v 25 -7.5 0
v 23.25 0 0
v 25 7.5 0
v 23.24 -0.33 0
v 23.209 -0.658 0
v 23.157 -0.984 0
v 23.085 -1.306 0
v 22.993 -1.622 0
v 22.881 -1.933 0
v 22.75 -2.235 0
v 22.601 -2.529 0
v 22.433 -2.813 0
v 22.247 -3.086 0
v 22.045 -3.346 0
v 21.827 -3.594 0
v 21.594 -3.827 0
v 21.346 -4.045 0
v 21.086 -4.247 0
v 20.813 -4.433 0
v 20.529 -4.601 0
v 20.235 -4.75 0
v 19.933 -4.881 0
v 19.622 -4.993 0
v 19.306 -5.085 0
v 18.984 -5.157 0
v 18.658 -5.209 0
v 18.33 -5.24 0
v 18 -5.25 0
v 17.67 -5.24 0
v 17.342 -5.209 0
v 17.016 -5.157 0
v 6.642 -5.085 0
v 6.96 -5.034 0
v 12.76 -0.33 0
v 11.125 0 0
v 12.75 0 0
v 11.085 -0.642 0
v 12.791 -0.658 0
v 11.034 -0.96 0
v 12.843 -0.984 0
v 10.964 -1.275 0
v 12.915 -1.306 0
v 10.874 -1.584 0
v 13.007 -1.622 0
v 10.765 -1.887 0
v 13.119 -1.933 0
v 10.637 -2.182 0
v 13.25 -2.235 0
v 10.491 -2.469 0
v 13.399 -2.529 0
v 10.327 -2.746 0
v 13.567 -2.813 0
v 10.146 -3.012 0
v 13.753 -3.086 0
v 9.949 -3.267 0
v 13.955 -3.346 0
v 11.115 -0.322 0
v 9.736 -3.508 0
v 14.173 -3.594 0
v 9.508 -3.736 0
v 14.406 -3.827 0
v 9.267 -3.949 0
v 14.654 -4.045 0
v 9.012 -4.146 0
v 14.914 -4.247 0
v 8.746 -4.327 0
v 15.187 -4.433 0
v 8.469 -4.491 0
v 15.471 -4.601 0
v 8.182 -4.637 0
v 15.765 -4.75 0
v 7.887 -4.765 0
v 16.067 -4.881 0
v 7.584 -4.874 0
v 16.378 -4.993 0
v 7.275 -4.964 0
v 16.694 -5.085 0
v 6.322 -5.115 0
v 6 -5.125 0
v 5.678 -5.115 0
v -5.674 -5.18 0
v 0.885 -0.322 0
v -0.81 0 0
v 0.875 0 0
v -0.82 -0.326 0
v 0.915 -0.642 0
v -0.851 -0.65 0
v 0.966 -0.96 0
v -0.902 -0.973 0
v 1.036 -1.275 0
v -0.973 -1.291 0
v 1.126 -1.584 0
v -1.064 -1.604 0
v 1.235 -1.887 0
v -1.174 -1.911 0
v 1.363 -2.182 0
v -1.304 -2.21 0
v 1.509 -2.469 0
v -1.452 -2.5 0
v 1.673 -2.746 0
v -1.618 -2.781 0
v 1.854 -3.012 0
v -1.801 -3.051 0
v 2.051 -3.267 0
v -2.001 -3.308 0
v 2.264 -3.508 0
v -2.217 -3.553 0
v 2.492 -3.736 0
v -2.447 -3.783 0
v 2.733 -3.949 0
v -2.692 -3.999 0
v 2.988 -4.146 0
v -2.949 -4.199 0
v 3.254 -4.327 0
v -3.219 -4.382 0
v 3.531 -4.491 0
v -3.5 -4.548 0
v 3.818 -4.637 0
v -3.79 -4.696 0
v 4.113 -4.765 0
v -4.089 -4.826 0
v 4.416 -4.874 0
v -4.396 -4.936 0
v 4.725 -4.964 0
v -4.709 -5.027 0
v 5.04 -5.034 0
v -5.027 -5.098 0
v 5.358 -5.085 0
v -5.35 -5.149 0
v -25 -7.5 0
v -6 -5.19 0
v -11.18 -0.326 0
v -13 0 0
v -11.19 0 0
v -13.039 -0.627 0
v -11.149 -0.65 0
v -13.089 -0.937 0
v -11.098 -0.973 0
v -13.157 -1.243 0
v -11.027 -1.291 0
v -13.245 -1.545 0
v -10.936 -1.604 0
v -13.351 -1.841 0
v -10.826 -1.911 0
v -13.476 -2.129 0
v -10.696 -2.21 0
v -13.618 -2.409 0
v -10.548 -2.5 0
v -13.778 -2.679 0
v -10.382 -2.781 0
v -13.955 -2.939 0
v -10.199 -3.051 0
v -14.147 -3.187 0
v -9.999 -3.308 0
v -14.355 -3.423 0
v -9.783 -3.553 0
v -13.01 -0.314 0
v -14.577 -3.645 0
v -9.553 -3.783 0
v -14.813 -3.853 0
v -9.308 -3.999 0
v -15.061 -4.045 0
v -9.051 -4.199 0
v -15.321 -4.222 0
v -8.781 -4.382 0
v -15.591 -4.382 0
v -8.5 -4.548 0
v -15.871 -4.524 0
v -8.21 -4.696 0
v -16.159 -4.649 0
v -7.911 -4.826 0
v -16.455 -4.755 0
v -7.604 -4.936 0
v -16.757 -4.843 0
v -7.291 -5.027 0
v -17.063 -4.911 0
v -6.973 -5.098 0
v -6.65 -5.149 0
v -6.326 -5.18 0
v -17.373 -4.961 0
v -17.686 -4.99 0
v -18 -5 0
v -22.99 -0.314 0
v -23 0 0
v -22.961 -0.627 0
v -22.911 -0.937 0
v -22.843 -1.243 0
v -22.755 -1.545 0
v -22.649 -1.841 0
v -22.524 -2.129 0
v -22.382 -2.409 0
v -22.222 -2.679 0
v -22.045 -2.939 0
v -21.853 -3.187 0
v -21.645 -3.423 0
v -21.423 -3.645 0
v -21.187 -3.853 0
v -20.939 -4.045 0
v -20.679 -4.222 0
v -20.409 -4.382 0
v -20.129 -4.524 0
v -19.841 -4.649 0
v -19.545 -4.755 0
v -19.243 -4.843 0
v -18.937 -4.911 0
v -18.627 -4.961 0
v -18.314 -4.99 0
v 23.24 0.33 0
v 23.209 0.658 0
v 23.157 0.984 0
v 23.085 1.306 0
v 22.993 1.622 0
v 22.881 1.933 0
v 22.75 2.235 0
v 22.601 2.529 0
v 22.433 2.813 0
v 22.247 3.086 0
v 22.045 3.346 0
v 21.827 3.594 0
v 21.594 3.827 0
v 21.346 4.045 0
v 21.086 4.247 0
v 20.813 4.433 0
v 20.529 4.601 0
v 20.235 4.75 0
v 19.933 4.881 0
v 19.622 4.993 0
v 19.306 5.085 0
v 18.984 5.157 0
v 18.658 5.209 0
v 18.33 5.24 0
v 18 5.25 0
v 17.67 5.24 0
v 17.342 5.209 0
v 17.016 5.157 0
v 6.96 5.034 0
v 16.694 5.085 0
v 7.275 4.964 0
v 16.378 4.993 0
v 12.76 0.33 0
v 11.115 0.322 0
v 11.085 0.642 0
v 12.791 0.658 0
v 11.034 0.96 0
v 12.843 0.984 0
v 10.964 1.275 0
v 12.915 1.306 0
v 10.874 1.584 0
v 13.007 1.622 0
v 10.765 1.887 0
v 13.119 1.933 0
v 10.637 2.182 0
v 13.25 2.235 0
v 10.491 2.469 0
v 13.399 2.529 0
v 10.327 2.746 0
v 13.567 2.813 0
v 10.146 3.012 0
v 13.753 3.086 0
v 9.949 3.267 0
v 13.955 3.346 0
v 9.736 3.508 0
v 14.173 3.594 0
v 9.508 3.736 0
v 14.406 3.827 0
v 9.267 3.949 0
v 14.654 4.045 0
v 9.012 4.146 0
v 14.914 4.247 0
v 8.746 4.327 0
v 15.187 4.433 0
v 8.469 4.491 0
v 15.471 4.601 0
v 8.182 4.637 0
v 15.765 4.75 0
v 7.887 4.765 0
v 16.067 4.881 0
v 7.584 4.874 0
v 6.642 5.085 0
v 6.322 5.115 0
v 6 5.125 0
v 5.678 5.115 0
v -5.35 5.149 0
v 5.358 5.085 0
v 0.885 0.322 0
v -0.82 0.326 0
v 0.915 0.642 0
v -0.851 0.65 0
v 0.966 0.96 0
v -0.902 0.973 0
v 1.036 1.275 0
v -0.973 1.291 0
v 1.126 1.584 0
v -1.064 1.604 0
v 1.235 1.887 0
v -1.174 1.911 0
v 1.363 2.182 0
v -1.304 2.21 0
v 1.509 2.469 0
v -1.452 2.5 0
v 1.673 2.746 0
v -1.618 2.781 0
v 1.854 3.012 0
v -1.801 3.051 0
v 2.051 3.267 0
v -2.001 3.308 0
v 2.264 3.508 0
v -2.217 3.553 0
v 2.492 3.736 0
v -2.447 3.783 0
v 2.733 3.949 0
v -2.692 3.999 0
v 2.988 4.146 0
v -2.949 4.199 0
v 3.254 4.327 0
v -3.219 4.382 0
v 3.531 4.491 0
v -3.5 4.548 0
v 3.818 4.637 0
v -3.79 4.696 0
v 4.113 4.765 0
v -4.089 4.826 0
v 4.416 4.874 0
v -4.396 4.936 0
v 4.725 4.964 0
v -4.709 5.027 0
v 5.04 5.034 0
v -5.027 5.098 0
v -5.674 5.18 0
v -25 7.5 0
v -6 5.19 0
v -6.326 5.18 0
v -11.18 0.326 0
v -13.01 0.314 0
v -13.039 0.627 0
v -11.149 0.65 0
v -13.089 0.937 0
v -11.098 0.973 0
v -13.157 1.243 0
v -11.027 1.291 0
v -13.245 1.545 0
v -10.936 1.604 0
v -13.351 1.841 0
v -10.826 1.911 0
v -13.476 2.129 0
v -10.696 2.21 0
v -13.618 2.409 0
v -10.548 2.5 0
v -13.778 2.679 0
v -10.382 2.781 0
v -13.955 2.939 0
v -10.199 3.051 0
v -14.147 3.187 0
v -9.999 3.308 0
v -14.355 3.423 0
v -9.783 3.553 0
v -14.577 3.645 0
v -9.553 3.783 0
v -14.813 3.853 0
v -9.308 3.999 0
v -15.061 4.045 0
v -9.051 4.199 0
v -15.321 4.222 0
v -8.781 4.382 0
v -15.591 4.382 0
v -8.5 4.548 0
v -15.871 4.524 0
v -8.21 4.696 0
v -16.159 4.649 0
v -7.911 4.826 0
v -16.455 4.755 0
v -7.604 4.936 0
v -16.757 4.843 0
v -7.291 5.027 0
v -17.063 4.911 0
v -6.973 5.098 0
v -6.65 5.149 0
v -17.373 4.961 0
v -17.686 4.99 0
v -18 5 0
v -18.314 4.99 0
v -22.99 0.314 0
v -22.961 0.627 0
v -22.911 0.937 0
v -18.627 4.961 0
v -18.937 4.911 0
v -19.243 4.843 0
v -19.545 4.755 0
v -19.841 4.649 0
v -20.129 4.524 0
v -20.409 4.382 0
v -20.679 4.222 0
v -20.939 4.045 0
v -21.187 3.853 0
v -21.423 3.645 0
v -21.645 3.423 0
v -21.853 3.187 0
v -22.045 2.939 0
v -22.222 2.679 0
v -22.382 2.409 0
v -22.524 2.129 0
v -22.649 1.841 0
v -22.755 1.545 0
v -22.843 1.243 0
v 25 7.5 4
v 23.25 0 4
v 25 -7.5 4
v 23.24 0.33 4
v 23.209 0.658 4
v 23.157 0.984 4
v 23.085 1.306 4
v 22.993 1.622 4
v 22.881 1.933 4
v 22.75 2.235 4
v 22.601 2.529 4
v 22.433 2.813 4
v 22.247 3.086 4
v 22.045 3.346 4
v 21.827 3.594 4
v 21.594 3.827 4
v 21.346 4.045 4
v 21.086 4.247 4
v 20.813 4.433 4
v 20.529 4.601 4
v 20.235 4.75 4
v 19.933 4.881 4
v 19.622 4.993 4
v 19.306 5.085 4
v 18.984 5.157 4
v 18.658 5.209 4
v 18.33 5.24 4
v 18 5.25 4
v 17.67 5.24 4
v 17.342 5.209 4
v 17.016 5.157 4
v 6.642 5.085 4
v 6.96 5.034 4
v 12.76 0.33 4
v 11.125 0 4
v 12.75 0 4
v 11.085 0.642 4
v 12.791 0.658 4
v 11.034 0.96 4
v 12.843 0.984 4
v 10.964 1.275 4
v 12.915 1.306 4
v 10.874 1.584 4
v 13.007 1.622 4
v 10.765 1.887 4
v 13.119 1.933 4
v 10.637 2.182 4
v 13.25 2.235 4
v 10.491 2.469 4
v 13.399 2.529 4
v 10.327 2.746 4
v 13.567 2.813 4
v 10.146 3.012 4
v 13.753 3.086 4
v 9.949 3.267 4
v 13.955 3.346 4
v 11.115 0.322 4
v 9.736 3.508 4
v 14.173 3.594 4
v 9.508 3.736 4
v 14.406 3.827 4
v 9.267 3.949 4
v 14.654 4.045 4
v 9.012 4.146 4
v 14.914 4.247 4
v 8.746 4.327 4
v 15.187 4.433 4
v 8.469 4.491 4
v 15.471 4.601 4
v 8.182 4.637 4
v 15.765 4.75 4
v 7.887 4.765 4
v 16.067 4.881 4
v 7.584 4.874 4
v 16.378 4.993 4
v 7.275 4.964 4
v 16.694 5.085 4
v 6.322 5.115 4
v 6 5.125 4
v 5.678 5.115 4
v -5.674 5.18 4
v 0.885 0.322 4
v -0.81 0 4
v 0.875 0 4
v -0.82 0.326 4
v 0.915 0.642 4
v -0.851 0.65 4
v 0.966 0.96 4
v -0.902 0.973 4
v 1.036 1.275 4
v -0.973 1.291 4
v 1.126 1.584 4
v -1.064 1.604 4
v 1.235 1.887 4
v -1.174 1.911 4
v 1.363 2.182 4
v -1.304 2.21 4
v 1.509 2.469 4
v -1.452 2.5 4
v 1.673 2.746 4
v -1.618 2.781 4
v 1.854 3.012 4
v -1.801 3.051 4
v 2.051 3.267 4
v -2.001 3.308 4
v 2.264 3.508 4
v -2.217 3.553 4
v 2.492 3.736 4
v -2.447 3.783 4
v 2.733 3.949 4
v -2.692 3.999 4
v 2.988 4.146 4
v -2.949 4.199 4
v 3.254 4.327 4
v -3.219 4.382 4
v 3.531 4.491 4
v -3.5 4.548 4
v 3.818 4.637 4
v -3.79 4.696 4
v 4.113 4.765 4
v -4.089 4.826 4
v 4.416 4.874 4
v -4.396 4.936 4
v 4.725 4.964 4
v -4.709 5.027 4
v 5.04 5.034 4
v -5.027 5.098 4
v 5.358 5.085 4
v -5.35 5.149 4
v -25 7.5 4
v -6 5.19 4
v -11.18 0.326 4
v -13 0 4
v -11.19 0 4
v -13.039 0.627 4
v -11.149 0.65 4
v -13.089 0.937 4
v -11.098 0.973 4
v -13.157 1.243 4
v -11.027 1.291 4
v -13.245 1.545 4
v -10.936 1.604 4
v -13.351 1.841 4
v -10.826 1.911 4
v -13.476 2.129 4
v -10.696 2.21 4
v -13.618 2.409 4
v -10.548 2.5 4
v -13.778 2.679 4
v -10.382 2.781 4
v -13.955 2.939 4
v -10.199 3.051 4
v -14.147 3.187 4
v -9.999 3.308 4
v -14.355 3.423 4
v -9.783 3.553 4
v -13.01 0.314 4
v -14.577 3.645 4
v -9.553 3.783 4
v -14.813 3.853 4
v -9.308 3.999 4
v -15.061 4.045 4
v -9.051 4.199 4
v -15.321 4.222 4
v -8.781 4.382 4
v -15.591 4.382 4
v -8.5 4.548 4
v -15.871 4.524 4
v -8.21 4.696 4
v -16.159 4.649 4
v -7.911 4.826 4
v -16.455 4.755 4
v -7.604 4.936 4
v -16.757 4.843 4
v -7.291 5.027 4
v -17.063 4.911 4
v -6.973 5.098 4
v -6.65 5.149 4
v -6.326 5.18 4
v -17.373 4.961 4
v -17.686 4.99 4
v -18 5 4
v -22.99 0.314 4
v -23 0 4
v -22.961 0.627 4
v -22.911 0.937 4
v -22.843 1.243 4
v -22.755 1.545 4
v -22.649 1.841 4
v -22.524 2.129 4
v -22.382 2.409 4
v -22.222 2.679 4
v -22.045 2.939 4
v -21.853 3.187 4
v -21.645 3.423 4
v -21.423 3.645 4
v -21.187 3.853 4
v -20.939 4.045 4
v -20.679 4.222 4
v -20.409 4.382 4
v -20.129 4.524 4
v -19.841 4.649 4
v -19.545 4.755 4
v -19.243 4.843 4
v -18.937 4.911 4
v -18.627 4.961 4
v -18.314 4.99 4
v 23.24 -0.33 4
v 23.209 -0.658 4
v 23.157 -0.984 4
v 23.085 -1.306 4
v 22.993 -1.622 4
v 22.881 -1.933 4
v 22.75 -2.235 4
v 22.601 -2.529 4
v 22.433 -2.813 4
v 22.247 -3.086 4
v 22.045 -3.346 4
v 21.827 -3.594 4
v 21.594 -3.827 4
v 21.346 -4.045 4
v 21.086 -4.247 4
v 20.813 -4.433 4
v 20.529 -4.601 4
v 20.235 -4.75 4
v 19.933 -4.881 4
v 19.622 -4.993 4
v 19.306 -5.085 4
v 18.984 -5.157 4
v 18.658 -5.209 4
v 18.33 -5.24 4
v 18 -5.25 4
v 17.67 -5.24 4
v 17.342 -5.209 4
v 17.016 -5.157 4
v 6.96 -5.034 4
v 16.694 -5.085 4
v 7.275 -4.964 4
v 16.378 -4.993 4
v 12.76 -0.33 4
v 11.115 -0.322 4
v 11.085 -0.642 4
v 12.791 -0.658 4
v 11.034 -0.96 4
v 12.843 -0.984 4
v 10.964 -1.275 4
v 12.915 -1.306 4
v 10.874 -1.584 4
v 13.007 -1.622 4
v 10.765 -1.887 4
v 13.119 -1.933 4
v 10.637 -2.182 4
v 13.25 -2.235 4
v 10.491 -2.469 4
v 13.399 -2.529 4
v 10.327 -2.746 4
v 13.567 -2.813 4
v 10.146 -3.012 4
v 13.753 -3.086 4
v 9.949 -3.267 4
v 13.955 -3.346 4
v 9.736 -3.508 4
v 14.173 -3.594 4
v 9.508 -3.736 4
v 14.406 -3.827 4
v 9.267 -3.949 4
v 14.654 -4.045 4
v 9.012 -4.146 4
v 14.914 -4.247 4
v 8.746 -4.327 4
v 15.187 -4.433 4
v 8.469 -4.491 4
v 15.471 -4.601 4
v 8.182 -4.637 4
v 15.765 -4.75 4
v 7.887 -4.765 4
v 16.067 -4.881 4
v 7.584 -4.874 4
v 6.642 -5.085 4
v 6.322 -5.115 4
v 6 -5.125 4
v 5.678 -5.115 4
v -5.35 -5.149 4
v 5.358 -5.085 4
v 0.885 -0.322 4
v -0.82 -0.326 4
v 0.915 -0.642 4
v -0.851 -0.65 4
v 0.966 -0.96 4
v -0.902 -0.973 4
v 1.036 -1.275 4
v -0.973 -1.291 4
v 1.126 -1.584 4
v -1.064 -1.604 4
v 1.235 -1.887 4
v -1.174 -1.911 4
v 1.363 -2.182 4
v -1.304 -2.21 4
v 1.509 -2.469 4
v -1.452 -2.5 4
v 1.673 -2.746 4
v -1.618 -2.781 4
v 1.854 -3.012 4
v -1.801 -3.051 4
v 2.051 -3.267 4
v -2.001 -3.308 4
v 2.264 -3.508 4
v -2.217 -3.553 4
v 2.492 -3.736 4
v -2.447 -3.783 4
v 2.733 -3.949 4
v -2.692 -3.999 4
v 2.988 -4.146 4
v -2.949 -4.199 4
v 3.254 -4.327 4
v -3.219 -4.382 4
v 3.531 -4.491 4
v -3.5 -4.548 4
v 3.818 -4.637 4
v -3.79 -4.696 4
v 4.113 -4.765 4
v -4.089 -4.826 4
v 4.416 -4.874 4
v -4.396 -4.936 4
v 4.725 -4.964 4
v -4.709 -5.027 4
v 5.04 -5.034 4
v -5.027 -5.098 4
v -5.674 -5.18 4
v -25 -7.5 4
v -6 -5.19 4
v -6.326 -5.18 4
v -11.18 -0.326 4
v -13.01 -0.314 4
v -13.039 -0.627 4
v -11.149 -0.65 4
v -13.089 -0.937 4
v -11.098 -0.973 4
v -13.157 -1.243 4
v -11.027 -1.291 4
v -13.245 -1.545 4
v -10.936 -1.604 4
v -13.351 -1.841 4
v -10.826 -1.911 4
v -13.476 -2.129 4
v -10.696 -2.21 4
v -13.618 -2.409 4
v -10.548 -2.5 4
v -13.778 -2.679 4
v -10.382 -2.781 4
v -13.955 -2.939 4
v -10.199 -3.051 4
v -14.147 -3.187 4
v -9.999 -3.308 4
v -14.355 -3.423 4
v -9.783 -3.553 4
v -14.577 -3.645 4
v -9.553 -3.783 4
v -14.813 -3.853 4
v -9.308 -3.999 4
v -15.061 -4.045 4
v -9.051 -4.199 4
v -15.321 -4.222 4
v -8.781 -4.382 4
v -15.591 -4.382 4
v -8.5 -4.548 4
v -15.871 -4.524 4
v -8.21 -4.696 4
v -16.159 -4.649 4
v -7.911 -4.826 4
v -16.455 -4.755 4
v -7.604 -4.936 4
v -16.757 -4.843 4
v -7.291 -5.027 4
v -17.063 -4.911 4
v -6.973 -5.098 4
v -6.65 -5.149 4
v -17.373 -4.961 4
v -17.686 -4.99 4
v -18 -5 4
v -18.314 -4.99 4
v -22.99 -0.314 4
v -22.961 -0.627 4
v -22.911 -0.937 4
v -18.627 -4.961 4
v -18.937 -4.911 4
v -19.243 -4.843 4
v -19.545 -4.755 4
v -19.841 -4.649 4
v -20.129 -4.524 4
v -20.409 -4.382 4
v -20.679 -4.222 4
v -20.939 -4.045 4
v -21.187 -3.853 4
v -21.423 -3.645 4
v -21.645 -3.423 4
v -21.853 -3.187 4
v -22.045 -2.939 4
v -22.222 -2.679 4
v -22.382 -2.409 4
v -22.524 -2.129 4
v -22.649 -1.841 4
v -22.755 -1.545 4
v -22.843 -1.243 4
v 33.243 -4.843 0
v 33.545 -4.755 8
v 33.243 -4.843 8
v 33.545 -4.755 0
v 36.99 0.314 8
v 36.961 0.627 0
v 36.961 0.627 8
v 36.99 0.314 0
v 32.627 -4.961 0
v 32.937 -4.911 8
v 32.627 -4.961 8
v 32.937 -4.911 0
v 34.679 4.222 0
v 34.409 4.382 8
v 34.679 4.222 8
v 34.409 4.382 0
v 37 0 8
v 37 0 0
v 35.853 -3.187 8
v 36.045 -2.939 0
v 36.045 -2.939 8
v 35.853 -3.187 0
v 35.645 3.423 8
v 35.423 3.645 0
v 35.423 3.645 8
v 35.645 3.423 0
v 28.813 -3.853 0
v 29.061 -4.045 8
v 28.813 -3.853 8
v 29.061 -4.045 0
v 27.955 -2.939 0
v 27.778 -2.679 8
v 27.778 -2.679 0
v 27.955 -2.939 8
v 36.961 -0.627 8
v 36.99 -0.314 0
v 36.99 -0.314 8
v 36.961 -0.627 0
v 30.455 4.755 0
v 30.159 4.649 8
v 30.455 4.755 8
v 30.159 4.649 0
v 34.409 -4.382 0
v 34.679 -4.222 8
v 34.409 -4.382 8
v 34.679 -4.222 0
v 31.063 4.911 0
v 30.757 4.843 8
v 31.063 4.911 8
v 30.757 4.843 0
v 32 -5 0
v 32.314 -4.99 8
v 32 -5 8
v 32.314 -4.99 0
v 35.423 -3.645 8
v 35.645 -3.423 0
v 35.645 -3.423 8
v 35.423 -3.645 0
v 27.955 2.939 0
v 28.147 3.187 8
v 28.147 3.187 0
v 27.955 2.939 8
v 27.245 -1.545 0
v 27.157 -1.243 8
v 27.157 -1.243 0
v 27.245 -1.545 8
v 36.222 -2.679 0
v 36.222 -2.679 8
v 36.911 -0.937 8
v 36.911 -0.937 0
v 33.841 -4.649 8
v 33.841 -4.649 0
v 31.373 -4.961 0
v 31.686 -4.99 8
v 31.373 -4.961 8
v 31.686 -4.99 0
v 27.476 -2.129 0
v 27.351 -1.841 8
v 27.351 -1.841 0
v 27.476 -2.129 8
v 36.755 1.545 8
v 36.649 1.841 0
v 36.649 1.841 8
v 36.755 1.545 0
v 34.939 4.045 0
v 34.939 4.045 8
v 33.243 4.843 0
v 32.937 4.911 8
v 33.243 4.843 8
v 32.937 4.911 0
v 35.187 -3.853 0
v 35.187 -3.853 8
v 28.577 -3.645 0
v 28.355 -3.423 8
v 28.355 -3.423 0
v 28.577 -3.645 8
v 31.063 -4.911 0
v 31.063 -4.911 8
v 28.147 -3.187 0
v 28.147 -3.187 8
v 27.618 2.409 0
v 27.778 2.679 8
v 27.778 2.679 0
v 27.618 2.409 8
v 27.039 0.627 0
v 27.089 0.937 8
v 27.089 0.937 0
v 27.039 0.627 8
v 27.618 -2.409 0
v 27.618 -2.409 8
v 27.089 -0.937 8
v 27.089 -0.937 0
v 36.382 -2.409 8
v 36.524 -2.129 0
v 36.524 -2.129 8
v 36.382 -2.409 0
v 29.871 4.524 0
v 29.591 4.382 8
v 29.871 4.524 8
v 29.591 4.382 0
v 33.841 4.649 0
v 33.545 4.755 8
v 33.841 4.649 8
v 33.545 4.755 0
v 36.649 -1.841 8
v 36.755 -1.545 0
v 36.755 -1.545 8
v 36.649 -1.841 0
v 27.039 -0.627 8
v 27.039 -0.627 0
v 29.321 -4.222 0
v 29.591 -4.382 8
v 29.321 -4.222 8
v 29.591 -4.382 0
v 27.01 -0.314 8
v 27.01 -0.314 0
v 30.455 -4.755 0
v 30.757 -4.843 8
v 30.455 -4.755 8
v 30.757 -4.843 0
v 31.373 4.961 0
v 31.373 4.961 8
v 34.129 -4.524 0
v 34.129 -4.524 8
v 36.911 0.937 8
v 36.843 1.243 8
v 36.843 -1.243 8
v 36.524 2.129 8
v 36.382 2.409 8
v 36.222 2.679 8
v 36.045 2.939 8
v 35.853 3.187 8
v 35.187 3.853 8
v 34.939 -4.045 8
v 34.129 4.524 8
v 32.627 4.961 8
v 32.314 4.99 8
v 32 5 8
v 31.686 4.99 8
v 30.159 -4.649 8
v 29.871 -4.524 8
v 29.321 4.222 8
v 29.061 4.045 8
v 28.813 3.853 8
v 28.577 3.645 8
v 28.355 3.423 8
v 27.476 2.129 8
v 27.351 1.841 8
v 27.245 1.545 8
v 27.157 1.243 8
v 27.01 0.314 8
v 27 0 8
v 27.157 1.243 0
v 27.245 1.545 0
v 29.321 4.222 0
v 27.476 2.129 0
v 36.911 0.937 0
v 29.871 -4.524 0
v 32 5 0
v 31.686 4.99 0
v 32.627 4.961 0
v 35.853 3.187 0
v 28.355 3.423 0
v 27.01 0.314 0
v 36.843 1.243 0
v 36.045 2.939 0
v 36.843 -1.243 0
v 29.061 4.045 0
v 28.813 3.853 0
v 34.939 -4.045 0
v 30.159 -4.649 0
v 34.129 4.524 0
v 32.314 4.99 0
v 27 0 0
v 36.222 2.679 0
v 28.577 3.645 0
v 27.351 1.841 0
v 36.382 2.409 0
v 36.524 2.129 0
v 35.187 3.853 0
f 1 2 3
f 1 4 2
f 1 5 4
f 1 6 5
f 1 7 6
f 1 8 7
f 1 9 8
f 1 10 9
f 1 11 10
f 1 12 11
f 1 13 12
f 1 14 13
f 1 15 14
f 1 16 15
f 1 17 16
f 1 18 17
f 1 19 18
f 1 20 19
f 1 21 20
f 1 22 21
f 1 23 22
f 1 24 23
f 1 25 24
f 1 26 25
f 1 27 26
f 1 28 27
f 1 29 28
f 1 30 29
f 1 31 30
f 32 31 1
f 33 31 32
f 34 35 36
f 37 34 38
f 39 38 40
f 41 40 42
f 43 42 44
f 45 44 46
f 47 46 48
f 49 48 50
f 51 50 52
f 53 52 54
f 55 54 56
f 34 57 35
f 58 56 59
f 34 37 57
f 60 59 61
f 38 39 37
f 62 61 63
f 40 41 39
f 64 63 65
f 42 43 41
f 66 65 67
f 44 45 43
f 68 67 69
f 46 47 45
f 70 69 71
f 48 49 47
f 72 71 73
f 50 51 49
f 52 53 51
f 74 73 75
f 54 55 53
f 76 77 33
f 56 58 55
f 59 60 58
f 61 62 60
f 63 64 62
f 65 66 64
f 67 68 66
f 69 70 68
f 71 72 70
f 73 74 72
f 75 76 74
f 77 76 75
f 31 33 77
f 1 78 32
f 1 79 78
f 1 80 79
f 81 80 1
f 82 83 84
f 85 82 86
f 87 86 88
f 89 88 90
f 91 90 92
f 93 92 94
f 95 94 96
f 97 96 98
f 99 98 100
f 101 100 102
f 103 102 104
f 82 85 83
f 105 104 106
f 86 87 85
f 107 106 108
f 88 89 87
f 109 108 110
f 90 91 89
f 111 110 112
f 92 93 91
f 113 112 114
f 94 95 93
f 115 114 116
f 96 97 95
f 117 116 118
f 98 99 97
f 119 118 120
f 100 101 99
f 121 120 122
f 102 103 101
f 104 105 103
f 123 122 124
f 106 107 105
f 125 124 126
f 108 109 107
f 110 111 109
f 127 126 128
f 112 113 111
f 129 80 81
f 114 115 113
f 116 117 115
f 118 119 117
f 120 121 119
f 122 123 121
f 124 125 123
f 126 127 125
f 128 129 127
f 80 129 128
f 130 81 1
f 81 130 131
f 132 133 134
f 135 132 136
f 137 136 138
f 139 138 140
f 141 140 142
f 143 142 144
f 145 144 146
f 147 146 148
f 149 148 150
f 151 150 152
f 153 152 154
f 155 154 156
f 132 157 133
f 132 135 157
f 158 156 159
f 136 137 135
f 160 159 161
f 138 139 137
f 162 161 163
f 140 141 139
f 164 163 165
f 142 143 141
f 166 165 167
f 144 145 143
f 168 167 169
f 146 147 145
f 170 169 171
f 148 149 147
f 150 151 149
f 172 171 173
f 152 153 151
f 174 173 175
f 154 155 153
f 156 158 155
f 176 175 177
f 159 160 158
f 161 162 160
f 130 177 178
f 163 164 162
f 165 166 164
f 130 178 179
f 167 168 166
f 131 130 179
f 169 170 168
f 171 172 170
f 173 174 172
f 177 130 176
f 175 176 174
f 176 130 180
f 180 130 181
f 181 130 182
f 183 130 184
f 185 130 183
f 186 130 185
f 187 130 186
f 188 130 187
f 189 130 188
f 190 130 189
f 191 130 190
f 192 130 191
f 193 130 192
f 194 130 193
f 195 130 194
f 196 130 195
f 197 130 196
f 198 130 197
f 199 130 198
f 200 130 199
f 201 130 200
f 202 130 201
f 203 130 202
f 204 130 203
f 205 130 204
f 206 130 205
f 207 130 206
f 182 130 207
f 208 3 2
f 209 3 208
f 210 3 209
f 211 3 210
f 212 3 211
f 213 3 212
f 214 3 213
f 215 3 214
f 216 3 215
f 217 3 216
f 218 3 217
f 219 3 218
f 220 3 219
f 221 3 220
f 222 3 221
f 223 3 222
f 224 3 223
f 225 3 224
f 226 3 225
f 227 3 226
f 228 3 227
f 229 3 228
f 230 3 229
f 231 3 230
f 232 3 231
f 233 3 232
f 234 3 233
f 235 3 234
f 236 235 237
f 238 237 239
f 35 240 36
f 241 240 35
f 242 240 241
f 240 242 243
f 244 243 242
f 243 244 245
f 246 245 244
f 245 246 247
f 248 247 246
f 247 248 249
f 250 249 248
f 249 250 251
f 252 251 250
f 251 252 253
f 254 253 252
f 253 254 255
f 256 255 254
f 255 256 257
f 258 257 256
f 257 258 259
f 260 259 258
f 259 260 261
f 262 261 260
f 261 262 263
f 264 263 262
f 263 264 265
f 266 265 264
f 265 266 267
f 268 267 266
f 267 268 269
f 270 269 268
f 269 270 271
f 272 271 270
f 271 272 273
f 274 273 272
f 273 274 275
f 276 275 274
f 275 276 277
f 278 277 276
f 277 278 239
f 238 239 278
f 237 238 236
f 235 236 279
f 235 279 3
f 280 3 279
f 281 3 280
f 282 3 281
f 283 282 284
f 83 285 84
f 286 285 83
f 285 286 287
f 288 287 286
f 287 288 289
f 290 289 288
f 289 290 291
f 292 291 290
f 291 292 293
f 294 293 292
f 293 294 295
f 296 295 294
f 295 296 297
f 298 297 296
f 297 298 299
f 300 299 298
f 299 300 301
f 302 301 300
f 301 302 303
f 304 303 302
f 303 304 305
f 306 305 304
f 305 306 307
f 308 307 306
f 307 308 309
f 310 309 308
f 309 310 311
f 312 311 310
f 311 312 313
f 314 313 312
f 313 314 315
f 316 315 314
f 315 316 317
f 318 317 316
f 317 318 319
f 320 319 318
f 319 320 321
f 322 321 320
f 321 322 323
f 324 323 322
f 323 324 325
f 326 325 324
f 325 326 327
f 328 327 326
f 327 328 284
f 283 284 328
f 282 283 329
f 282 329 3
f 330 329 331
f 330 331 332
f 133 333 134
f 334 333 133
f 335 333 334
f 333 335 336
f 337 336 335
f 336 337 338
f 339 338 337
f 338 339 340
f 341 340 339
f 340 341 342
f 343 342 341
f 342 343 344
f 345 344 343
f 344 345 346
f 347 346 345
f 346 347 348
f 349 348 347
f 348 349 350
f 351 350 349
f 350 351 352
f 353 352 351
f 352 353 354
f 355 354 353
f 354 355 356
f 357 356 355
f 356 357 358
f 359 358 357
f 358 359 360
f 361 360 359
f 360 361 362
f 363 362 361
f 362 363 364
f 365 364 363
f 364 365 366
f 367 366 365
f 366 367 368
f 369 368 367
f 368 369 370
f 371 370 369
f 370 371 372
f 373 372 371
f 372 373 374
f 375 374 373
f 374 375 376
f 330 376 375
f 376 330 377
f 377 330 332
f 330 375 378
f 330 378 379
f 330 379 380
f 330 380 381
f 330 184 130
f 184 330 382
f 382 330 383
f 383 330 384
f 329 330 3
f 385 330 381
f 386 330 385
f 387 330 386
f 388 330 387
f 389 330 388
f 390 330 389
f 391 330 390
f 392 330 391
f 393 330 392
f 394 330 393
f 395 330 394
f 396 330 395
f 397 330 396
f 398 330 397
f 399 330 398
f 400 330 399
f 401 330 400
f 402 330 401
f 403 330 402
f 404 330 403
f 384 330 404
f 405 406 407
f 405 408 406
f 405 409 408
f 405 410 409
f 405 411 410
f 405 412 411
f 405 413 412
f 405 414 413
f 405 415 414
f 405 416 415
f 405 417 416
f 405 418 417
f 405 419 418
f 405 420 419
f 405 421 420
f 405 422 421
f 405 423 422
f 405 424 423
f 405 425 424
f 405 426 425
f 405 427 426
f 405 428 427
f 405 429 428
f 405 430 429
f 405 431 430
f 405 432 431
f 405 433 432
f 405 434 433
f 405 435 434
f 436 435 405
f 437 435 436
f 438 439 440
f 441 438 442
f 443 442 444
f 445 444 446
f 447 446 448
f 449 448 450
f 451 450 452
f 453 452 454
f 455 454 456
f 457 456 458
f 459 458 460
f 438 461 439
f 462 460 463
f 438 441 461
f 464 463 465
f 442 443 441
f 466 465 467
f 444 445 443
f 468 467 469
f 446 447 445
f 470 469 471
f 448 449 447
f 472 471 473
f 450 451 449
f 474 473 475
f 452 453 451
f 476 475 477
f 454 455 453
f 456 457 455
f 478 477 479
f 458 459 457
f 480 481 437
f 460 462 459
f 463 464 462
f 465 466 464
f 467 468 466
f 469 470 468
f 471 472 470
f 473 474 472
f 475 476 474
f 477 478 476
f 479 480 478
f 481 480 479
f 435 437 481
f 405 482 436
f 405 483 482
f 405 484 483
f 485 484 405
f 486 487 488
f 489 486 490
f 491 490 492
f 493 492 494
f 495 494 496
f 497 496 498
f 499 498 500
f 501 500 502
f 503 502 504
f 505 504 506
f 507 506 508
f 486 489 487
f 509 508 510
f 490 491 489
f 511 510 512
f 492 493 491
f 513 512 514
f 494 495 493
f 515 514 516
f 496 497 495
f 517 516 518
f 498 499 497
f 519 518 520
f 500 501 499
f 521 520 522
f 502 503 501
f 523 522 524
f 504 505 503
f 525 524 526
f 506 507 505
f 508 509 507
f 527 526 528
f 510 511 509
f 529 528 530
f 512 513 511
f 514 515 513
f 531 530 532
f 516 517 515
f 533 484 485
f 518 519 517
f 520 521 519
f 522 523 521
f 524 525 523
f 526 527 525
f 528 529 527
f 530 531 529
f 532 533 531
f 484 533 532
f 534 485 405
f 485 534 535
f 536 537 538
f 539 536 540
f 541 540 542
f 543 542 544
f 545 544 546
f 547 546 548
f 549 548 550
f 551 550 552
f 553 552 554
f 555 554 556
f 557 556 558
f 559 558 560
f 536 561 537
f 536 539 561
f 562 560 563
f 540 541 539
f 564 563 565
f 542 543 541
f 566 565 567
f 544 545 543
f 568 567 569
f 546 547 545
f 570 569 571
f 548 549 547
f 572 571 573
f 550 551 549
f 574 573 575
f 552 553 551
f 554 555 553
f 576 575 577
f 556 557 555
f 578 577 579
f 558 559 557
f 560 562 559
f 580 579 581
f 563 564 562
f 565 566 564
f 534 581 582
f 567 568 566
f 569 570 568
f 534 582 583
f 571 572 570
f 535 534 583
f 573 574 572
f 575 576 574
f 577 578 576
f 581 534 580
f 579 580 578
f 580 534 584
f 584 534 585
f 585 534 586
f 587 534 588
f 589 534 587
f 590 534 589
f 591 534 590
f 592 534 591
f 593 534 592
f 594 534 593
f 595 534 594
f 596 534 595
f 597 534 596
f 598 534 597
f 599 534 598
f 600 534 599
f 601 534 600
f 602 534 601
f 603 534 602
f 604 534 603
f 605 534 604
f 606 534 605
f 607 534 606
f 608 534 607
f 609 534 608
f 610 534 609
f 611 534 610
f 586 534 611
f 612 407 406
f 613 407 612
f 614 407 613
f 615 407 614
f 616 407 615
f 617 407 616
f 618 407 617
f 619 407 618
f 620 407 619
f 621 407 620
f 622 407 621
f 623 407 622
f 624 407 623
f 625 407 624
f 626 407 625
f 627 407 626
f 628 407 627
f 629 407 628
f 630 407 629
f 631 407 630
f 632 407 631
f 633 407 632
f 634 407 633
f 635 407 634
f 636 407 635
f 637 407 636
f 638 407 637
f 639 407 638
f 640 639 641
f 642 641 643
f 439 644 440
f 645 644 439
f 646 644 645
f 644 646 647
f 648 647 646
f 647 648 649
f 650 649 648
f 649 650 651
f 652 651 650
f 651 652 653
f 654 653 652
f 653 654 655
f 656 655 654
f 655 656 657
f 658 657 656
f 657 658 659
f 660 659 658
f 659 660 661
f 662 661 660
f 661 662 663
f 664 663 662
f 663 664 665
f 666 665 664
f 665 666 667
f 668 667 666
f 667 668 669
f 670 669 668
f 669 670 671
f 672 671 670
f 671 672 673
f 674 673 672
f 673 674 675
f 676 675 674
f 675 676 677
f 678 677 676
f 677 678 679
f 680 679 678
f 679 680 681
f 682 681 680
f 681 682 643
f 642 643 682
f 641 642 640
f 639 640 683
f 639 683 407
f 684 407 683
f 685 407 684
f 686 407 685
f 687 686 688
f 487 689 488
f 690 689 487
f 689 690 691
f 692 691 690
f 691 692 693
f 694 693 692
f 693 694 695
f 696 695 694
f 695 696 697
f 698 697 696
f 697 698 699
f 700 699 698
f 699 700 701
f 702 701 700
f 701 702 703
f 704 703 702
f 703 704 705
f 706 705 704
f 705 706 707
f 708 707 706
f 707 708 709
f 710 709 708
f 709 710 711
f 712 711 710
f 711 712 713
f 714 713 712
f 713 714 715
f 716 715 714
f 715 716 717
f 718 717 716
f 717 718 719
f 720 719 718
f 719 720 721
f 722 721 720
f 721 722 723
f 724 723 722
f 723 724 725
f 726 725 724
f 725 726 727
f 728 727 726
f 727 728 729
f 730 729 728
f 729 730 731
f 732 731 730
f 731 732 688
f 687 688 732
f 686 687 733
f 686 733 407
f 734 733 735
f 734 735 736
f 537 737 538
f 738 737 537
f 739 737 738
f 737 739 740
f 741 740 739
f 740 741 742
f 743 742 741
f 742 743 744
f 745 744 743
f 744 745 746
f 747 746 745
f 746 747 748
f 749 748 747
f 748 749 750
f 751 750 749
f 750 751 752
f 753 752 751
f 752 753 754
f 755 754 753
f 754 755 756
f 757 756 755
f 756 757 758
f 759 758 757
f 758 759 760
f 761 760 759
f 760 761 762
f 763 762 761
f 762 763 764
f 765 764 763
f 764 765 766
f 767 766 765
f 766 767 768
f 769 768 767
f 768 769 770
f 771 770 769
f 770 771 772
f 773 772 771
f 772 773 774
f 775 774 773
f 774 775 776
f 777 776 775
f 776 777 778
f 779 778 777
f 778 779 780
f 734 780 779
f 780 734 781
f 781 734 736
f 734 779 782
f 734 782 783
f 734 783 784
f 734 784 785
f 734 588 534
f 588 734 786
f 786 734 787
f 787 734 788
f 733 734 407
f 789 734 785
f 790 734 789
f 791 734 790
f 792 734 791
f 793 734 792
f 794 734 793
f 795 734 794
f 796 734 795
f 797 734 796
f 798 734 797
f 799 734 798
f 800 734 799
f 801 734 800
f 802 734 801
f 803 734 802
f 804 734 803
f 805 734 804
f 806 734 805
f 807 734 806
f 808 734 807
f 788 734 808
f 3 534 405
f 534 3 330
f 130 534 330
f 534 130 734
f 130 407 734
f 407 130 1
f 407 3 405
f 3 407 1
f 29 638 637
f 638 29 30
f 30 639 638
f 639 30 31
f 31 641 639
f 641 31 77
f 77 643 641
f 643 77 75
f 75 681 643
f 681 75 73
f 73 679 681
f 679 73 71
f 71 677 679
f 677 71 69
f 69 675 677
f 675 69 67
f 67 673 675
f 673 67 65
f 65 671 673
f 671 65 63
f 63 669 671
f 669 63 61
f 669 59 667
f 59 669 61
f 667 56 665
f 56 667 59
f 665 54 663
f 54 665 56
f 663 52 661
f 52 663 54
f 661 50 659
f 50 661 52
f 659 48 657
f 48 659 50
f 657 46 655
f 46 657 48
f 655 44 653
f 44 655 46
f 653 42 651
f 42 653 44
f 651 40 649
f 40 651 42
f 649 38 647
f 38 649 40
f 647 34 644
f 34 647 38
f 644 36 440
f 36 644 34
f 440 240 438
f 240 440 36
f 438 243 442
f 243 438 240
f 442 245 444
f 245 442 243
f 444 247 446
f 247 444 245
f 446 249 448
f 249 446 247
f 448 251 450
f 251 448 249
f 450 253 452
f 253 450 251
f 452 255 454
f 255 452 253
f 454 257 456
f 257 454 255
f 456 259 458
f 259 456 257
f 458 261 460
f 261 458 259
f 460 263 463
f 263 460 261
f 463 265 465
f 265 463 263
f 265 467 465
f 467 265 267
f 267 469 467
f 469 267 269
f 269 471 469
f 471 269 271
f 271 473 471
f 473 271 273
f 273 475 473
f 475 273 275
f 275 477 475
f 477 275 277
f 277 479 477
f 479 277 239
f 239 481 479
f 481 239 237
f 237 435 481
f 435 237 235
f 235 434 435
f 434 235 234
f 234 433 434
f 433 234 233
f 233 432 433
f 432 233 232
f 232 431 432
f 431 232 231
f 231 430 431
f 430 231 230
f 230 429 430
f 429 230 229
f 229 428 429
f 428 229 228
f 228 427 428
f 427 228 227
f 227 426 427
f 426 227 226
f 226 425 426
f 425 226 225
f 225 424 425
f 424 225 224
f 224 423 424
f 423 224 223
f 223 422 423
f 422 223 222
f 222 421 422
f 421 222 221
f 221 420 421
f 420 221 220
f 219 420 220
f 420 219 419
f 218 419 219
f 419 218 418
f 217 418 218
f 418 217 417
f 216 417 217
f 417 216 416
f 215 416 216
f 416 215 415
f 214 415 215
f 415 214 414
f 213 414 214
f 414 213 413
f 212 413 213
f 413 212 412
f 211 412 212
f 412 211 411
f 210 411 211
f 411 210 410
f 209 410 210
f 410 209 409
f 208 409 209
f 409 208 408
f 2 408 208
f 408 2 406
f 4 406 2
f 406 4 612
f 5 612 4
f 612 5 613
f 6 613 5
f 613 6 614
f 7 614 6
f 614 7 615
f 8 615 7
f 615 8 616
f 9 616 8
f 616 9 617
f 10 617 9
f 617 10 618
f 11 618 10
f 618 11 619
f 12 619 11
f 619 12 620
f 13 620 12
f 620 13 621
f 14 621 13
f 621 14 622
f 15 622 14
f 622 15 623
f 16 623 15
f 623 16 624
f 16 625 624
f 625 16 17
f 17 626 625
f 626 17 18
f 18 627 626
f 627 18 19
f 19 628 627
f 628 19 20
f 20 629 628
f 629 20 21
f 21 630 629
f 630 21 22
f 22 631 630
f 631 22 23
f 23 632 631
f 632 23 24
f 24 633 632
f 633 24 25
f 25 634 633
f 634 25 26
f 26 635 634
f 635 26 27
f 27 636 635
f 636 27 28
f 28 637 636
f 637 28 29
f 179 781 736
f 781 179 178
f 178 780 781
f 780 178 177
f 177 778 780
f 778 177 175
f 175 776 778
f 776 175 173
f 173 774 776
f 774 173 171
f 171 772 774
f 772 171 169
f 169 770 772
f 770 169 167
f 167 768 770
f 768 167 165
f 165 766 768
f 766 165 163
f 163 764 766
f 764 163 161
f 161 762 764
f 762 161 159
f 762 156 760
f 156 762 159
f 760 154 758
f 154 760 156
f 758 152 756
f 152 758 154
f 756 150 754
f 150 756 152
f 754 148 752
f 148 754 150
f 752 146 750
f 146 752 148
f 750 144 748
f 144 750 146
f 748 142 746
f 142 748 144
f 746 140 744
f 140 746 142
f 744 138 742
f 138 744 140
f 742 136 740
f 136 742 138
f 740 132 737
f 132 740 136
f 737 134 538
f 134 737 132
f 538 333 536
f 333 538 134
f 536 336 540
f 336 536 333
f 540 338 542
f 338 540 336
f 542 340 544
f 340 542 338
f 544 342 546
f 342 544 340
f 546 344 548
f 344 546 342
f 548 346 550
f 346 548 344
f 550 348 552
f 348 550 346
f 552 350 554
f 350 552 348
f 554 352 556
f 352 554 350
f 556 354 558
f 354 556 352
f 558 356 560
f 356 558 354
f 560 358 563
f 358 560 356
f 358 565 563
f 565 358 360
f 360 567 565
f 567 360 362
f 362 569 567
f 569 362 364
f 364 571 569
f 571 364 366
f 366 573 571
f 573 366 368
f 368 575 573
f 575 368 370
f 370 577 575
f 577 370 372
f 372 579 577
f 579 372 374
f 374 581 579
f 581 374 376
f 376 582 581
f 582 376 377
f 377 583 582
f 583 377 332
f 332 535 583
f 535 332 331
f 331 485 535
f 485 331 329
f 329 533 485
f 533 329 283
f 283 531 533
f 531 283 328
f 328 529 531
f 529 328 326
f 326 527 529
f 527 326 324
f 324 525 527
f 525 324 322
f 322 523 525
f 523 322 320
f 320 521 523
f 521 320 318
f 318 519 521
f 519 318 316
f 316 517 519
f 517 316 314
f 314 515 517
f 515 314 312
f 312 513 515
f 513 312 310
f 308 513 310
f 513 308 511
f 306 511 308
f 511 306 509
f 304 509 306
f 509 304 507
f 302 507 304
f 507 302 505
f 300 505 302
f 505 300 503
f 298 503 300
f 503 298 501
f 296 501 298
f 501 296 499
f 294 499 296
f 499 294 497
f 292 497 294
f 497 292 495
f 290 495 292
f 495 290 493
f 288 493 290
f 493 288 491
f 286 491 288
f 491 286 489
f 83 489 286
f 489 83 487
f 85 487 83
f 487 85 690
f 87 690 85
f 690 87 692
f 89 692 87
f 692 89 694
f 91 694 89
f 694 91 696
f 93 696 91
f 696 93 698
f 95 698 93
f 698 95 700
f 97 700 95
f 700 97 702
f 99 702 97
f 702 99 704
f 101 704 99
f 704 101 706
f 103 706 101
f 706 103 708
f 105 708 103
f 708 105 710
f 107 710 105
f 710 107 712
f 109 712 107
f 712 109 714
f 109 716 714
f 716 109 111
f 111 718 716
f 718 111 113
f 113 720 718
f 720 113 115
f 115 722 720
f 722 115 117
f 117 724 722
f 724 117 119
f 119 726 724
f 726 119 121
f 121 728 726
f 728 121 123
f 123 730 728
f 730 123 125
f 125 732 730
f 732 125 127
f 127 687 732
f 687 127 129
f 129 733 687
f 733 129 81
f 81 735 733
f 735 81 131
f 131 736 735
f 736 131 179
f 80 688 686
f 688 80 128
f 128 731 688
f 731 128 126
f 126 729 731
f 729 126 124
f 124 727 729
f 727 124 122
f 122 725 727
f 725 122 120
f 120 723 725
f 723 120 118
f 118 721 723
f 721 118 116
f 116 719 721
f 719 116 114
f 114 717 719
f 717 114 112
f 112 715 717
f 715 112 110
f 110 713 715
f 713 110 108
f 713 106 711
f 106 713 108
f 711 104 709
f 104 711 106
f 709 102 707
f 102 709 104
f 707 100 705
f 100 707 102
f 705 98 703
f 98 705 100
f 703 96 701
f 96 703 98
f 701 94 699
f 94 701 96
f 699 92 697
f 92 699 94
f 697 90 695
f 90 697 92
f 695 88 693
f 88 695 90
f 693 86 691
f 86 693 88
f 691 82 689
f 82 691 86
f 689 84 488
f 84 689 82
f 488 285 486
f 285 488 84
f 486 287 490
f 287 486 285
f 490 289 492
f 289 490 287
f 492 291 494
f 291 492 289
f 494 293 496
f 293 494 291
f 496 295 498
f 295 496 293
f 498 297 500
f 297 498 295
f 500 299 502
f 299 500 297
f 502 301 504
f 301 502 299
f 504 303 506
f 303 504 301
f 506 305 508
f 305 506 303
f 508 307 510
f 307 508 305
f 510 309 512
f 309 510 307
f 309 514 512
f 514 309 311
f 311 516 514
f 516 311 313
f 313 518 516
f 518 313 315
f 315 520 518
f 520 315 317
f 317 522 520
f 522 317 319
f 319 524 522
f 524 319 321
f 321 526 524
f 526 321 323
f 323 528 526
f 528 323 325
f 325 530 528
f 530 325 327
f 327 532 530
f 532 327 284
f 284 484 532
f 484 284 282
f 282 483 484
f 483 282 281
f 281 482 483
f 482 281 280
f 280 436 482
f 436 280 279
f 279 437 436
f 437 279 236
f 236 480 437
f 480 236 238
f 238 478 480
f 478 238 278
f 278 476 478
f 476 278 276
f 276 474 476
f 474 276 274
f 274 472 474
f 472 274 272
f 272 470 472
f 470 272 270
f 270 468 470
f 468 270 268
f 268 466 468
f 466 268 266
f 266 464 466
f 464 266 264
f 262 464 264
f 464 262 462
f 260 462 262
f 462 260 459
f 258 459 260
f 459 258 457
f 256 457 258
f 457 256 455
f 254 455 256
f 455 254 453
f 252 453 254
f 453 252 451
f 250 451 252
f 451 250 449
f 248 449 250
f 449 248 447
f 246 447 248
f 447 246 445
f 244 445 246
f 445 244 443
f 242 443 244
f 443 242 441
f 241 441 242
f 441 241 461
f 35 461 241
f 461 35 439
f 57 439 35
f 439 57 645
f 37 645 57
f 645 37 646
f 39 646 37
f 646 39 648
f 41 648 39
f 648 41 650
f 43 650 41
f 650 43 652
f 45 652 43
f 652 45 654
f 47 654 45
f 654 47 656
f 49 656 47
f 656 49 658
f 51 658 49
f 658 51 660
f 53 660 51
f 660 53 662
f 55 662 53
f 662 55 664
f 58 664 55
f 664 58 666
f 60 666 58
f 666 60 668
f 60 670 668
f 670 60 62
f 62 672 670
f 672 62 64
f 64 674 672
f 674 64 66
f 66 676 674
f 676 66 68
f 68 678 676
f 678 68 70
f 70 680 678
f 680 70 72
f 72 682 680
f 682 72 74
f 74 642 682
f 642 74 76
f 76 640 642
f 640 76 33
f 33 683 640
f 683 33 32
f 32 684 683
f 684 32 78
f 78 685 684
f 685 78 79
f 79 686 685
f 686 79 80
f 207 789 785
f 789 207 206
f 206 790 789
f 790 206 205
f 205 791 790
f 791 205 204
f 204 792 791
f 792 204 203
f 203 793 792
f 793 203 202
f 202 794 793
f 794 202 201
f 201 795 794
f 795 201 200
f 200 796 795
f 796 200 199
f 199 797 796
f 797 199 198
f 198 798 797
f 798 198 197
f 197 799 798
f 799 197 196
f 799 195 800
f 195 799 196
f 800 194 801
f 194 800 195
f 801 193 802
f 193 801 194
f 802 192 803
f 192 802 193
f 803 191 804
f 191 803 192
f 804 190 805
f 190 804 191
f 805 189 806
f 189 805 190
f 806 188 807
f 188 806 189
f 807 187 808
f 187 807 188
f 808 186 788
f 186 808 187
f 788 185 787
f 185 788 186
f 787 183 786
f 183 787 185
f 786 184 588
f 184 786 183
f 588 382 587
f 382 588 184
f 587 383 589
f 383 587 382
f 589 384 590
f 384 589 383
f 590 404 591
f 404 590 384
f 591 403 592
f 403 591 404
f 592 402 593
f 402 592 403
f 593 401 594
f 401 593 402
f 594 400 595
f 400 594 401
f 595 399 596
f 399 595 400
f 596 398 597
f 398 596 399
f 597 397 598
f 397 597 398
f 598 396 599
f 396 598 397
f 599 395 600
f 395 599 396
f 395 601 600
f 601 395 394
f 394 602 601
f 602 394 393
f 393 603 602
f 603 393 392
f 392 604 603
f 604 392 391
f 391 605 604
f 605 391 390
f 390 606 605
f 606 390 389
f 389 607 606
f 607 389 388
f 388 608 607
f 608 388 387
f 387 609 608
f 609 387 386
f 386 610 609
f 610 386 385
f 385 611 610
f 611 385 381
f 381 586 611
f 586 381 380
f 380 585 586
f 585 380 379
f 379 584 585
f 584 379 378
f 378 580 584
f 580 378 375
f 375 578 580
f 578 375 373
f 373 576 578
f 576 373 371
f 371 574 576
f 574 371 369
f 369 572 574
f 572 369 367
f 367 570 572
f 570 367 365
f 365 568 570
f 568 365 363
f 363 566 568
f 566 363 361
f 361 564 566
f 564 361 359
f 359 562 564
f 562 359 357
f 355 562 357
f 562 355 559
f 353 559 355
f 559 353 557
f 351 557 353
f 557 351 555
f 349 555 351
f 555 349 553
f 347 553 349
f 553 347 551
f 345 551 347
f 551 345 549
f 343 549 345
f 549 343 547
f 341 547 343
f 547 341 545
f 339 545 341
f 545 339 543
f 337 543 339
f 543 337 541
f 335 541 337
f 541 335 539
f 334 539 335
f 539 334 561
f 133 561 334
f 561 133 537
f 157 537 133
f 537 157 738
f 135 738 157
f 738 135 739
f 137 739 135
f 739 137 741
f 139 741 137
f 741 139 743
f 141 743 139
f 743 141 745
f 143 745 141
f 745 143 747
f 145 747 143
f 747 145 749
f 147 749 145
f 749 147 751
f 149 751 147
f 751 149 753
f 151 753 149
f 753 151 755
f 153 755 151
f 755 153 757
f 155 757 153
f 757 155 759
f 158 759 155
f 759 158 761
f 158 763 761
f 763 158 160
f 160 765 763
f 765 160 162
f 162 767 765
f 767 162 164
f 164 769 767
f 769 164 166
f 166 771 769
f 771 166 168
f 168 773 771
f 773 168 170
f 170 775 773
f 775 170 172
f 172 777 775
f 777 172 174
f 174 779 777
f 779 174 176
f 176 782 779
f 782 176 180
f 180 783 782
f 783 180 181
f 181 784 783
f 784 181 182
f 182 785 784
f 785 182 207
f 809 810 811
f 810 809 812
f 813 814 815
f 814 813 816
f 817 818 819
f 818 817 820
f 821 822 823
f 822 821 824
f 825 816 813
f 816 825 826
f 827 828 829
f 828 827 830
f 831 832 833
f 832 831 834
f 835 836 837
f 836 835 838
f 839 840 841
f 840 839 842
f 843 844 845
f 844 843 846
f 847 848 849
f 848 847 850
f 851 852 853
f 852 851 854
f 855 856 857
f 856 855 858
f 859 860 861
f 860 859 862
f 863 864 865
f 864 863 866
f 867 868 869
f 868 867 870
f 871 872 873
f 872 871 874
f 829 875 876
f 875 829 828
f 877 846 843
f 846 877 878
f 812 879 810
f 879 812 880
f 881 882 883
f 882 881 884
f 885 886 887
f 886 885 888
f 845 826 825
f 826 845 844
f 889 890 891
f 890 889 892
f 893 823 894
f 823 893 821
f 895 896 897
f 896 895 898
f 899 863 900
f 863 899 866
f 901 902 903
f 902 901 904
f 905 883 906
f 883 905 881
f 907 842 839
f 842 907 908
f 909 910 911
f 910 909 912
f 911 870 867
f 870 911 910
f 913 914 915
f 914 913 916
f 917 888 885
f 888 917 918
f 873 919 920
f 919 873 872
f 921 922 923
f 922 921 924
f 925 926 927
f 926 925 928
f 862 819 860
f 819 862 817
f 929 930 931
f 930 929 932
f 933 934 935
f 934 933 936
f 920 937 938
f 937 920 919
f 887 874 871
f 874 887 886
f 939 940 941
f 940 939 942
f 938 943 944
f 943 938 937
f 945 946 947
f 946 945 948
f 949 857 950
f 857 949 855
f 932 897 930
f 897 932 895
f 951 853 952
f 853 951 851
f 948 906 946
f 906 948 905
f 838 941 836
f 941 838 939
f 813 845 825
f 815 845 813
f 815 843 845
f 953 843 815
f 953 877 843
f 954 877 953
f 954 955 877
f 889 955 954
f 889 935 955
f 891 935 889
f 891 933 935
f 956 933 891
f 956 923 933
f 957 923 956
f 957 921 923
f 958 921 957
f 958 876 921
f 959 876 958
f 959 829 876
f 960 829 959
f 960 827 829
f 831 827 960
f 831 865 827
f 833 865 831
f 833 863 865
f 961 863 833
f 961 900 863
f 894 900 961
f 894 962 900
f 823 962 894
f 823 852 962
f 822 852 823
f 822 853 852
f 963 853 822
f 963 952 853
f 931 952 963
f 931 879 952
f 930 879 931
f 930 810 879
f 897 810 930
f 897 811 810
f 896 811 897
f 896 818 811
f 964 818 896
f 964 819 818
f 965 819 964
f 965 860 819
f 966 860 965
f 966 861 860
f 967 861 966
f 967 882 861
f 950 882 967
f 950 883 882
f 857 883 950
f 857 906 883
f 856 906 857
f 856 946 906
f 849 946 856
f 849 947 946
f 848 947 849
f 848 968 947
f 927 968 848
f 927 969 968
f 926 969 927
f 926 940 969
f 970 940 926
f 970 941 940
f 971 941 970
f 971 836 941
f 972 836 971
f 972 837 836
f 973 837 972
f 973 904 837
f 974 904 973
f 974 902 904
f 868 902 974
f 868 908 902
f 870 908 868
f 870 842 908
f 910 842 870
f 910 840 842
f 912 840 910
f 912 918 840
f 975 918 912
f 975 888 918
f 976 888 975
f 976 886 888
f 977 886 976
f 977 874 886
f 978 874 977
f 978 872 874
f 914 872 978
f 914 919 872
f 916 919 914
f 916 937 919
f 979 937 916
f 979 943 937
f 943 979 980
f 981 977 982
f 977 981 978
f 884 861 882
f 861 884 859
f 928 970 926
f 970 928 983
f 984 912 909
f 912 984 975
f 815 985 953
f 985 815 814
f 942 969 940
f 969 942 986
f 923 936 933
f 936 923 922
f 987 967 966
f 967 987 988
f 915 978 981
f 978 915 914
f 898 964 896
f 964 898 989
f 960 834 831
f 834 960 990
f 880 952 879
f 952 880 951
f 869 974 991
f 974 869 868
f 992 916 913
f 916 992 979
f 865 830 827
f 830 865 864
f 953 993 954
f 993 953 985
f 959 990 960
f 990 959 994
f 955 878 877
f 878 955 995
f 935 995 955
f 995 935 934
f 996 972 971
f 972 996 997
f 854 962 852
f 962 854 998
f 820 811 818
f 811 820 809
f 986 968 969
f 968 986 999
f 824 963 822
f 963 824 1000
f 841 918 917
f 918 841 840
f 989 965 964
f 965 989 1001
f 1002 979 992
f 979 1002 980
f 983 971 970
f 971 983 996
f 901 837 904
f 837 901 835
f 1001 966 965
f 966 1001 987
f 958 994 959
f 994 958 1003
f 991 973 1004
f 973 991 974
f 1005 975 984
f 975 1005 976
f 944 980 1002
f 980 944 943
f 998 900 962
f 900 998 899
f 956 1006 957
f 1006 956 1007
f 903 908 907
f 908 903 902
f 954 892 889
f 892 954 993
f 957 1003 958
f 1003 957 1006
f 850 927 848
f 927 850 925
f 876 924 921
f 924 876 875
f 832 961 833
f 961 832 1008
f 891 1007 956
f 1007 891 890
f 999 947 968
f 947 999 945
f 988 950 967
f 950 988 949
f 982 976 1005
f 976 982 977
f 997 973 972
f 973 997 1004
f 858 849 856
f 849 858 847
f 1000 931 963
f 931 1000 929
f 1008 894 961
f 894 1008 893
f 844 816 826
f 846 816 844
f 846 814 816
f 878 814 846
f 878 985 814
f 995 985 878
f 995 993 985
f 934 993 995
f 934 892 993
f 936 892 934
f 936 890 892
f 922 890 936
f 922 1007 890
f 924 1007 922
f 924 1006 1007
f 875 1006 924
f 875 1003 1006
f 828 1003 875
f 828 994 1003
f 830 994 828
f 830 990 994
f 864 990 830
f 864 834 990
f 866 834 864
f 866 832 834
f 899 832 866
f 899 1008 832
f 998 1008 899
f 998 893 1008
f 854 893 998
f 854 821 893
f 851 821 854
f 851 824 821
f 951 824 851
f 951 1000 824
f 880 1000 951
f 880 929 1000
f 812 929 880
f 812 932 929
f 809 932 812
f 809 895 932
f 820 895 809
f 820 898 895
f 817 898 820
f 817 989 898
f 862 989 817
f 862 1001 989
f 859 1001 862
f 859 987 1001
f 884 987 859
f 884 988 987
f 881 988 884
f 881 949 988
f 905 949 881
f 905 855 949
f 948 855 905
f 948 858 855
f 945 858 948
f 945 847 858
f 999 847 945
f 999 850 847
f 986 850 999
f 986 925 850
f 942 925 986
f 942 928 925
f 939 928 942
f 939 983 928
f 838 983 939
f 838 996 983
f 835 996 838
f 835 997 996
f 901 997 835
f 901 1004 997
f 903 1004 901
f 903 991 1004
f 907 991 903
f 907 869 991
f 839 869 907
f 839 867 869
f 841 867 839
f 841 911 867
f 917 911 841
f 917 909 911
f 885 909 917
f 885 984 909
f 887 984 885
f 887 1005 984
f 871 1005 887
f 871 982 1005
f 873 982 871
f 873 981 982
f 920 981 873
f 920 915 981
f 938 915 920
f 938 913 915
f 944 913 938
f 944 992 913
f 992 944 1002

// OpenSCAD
//0.38 mm for Tighter Fit
//0.25 mm for press fit
//0.5 mm for easy fit
$fn=100;
linear_extrude( height= 4)
{

difference()
{
square([50,15],center=true);

translate([-18,0,0])
#circle( r = 5);

translate([-6,0,0])
#circle( r = 5 + (0.38) / 2);

translate([6,0,0])
#circle( r = 5 + (0.25 / 2));

translate([18,0,0])
#circle( r = 5 + (0.5 / 2));
}
}

linear_extrude(height=8)
translate([32,0,0])
circle(r=5);
